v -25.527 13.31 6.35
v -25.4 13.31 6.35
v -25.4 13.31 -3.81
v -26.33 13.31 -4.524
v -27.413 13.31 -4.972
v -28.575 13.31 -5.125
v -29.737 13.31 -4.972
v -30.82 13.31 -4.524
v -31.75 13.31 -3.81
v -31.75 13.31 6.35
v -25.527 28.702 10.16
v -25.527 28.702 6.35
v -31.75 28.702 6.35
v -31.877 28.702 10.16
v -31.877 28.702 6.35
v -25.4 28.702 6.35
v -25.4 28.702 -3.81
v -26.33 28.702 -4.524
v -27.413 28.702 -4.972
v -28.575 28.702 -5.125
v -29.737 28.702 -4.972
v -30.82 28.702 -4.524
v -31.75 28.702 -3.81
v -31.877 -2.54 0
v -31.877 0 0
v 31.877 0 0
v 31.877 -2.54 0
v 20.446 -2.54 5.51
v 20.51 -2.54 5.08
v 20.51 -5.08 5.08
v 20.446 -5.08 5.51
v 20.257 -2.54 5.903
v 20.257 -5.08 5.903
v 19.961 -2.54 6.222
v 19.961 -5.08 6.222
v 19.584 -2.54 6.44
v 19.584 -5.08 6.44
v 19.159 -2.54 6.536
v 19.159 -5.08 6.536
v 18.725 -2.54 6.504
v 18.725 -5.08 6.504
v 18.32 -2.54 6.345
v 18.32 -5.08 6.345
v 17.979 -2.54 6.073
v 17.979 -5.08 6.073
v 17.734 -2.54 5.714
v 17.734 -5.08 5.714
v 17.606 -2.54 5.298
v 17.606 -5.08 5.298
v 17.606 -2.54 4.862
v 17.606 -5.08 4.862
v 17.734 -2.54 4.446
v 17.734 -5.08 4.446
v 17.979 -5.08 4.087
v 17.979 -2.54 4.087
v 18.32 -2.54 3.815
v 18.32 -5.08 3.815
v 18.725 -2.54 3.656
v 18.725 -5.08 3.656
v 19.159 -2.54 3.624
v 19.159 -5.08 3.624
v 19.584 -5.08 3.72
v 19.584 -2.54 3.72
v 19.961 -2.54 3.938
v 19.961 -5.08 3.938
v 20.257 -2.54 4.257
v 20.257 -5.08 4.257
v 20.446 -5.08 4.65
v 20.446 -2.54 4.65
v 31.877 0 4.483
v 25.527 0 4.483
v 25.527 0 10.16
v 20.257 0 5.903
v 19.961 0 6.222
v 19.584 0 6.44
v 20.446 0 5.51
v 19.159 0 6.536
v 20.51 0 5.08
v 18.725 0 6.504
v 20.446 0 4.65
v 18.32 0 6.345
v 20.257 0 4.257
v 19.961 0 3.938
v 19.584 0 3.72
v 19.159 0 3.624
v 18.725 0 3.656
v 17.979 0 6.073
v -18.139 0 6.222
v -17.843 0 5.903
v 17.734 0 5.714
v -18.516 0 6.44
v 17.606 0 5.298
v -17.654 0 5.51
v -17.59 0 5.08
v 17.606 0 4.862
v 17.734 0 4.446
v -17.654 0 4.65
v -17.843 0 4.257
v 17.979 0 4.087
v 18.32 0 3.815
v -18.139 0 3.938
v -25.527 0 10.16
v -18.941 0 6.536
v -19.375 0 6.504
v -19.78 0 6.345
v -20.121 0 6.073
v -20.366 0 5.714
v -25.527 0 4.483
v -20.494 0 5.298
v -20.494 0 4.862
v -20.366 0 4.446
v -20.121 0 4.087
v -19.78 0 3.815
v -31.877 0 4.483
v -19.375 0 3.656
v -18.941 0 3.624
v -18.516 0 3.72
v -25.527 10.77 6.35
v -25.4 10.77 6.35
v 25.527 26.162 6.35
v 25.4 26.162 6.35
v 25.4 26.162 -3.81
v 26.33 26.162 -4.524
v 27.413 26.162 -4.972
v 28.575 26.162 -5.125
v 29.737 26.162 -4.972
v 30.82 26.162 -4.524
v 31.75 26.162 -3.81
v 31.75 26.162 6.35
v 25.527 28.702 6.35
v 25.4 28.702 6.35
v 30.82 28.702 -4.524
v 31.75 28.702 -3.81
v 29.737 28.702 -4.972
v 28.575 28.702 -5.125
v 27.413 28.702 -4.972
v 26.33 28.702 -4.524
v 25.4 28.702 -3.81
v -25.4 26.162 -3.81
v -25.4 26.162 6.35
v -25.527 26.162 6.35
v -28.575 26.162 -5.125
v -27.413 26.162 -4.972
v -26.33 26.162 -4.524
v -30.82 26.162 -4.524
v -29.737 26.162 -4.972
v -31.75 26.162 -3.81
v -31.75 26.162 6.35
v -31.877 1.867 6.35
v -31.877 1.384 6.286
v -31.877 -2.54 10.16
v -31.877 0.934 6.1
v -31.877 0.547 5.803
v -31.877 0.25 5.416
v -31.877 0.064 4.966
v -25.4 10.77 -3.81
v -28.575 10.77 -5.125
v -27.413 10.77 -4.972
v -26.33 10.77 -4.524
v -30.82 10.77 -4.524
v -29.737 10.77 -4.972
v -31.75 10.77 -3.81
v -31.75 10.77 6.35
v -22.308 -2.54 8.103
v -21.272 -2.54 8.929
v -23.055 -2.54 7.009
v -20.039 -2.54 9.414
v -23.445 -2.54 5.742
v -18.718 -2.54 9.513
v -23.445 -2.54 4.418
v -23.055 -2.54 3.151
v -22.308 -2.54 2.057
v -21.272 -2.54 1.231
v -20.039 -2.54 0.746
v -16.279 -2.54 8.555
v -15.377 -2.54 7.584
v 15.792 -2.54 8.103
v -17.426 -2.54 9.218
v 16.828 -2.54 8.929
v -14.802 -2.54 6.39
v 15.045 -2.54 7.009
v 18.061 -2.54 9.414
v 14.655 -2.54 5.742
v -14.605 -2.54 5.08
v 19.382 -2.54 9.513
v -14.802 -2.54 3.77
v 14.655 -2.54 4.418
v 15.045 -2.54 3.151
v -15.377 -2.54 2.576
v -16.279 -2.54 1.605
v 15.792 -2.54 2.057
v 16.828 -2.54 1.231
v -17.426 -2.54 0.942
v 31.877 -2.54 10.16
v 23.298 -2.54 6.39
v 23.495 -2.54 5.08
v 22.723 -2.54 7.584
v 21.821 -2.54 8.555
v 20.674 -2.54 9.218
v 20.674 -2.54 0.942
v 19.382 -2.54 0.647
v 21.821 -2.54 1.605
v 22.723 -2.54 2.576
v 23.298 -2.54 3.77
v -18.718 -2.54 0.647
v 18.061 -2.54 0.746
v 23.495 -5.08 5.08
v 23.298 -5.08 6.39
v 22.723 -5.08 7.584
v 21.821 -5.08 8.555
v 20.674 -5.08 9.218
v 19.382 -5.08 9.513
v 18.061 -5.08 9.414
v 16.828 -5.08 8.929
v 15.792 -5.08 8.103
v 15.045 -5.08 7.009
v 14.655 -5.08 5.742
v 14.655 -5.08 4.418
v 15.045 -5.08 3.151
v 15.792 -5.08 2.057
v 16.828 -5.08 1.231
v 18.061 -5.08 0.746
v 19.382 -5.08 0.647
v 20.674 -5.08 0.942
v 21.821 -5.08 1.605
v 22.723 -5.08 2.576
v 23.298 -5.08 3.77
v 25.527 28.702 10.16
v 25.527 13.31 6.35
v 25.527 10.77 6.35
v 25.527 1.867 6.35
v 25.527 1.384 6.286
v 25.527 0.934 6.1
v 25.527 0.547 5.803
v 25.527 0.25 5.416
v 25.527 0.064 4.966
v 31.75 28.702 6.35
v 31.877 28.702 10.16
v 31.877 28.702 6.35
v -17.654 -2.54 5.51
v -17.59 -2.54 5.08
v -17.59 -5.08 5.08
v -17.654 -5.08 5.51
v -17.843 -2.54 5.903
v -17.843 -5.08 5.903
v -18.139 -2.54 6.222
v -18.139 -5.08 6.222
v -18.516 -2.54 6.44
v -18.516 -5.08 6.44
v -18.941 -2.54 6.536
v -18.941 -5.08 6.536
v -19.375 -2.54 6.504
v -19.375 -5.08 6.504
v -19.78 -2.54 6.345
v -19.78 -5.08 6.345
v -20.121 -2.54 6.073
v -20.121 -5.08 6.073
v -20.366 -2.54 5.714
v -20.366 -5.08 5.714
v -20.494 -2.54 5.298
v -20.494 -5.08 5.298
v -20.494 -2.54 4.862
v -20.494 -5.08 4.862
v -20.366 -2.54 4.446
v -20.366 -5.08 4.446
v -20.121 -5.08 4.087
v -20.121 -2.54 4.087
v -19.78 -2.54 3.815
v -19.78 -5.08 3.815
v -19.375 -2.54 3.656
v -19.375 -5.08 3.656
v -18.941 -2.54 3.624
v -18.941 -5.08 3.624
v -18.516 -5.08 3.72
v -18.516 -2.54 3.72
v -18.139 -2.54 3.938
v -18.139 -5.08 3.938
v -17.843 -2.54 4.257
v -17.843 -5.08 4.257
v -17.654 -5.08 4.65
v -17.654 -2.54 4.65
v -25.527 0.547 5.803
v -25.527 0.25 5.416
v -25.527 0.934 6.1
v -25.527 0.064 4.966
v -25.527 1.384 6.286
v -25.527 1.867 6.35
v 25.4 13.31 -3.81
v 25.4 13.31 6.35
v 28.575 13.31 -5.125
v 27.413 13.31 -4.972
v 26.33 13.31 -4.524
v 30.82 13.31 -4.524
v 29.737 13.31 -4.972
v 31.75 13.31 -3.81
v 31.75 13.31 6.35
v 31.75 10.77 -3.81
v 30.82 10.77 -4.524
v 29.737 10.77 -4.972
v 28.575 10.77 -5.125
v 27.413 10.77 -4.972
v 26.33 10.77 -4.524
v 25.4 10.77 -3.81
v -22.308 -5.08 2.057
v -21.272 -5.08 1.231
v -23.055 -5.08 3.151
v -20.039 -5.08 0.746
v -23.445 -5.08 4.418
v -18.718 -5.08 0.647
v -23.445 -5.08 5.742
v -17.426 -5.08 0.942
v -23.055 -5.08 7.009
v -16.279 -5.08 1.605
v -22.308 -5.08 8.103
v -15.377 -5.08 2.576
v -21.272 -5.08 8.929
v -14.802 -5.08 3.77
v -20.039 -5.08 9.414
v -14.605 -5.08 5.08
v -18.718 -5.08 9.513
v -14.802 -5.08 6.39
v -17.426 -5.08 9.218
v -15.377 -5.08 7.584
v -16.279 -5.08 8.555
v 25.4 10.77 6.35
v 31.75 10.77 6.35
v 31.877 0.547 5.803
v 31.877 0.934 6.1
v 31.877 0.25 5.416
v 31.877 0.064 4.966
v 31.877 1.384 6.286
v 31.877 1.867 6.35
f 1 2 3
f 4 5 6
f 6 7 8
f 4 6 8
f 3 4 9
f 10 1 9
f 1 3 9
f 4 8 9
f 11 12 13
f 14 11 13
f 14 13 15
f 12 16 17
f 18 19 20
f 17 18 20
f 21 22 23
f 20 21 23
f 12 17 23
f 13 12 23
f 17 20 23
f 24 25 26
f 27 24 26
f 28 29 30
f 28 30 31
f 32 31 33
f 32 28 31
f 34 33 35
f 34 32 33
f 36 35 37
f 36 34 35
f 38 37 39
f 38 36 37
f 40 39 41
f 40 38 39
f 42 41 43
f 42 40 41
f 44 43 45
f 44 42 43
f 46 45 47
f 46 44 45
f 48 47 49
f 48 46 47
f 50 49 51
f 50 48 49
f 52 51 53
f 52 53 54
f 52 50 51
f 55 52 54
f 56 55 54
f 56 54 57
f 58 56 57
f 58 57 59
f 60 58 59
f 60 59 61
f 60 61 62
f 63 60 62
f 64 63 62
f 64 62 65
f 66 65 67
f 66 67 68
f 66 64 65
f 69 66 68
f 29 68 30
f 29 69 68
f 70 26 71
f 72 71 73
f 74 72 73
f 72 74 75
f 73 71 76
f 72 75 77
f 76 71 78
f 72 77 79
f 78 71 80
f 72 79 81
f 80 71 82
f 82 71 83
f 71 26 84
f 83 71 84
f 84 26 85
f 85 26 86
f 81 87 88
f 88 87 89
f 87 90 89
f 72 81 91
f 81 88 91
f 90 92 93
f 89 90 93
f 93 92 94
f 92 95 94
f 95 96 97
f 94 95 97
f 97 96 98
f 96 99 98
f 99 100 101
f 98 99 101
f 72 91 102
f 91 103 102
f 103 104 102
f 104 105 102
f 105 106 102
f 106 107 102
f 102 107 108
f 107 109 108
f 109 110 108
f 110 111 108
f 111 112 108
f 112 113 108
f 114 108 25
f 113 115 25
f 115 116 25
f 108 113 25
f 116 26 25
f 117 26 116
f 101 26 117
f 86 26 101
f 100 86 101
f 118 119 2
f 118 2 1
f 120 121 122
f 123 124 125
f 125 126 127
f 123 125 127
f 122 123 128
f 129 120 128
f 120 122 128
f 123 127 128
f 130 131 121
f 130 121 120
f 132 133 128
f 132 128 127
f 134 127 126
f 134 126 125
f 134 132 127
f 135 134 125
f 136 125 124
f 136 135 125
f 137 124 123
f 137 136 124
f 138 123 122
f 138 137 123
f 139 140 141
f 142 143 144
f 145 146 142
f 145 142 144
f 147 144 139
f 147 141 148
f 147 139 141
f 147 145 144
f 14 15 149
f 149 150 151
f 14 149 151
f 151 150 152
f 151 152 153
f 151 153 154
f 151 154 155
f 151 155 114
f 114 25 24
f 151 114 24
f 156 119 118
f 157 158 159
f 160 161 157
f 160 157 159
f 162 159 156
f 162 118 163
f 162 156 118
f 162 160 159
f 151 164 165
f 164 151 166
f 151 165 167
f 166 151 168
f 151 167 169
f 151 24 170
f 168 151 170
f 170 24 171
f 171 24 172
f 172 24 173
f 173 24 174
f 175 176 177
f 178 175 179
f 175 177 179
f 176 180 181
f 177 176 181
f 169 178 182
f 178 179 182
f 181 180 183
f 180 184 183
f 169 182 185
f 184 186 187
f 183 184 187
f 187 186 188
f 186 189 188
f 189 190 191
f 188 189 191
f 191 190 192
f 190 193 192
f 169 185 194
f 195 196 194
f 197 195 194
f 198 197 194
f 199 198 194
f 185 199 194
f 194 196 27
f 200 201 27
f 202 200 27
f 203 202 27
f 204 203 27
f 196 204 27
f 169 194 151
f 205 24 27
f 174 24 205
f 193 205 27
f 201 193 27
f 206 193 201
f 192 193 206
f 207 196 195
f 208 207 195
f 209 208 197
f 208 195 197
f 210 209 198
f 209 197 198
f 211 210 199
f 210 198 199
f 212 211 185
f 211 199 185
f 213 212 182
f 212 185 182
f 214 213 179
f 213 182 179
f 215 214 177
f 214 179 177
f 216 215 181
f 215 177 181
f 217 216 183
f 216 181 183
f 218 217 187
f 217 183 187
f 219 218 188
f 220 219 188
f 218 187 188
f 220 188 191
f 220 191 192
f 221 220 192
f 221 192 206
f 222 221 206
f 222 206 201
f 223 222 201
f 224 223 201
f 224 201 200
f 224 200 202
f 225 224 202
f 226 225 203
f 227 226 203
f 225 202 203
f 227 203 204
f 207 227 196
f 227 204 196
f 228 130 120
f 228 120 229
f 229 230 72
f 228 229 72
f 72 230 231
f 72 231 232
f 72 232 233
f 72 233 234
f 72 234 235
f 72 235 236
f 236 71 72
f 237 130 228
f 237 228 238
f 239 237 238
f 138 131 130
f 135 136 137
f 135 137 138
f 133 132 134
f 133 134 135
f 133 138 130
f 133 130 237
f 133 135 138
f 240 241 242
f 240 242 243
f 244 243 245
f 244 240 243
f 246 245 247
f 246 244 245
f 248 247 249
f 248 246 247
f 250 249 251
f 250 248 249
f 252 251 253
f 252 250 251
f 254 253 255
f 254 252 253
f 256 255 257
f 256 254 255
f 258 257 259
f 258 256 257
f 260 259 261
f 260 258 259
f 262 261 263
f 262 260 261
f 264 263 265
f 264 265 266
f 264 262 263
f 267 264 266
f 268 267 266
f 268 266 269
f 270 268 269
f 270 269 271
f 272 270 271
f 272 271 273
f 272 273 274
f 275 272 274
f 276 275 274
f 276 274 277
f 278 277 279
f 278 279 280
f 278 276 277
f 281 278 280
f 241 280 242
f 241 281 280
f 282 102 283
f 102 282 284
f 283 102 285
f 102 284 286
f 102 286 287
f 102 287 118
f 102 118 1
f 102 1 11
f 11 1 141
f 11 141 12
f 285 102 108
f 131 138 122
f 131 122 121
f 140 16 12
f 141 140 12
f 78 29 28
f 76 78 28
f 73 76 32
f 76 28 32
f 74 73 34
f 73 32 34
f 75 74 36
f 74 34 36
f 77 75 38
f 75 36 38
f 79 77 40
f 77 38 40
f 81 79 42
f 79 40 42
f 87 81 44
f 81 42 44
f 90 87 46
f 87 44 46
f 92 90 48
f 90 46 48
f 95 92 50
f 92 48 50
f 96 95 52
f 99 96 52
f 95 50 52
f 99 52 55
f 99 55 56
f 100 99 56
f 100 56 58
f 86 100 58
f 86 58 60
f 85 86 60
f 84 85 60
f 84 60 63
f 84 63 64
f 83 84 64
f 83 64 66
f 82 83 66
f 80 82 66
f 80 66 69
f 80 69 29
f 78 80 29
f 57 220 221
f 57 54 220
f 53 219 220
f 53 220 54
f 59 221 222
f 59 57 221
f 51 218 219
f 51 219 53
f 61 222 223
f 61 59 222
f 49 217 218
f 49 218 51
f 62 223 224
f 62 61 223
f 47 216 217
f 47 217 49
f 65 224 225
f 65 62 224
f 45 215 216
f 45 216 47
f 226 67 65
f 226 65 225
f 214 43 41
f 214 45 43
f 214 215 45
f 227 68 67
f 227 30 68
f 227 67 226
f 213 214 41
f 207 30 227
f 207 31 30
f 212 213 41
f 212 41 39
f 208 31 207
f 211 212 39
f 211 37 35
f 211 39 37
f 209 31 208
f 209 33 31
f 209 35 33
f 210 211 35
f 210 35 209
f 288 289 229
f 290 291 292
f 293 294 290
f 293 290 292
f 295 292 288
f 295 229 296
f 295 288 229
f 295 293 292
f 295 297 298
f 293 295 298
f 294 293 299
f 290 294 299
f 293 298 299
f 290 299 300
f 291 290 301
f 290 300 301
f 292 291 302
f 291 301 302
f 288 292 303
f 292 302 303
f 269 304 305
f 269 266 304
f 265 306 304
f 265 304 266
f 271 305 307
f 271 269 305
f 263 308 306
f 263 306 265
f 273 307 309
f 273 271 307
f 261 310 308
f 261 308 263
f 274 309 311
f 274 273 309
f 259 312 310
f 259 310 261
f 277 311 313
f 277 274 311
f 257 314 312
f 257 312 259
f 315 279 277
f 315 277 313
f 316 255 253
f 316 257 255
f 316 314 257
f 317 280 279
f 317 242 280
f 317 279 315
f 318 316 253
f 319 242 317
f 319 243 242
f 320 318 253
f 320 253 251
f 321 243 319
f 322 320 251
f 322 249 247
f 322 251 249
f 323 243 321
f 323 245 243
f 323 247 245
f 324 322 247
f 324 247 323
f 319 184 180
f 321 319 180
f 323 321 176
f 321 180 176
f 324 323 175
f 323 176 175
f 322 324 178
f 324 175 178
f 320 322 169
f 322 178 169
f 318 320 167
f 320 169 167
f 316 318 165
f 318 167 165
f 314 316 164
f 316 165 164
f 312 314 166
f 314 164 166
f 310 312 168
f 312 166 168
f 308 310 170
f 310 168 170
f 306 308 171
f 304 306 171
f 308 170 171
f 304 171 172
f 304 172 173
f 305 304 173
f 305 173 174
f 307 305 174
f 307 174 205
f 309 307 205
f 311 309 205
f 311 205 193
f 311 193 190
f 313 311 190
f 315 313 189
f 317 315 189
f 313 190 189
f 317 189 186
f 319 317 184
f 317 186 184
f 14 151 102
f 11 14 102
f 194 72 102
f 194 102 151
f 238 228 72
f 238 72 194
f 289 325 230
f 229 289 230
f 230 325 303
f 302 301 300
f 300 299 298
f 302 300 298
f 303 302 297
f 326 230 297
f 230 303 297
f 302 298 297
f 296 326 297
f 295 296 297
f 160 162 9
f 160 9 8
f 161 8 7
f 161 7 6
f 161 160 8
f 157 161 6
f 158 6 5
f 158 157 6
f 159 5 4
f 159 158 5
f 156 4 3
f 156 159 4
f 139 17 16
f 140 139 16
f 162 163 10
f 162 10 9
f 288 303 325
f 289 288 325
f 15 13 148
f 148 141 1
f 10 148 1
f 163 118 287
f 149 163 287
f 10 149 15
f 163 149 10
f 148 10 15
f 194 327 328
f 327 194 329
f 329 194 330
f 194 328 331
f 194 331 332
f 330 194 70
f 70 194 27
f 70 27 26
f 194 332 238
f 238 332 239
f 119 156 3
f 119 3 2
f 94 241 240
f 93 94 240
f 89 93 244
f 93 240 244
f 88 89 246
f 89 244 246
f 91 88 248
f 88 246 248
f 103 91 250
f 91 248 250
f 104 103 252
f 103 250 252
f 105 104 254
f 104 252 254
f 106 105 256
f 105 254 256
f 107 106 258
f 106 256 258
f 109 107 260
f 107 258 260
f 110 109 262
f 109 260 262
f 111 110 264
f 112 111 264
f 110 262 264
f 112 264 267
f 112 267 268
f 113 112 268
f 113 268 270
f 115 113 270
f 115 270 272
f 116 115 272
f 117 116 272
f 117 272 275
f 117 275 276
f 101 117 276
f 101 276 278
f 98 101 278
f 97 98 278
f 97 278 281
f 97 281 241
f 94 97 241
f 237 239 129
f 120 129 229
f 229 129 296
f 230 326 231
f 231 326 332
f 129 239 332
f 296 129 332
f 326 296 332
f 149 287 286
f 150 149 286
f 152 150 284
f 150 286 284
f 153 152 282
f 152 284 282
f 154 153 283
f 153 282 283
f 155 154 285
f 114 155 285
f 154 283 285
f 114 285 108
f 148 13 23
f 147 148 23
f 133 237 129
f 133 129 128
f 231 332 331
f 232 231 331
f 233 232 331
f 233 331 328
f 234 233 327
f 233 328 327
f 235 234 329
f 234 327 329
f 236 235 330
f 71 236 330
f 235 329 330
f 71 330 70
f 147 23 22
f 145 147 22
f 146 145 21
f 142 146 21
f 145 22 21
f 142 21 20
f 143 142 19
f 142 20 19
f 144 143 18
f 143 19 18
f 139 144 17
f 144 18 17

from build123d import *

# Parameters (mm, degrees)
BOSS_EXTRUDE1_DEPTH  = 10.16
CUT_EXTRUDE1_DEPTH   = 64.754
SKETCH3_R            = 1.4605
CUT_EXTRUDE2_DEPTH   = 6.35
BOSS_EXTRUDE2_DEPTH  = 2.54
MIRROR2_COPY_1_DEPTH = 2.54
SKETCH6_R            = 4.445
SKETCH6_R_2          = 1.4605
BOSS_EXTRUDE3_DEPTH  = 2.54


with BuildPart() as part:
    # Sketch1 → Boss-Extrude1 (new body)
    with BuildSketch(Plane.XY):
        Polygon((25.527, 0), (-25.527, 0), (-25.527, 28.702), (-31.877, 28.702), (-31.877, -2.54), (31.877, -2.54), (31.877, 28.702), (25.527, 28.702), align=None)
    extrude(amount=BOSS_EXTRUDE1_DEPTH)

    # Sketch2 → Cut-Extrude1 (cut, through all)
    with BuildSketch(Plane(origin=(31.877, 0, 0), x_dir=(0, 0, -1), z_dir=(1, 0, 0))):
        with BuildLine():
            Line((-6.35, 28.702), (-6.35, 1.867416652))
            ThreePointArc((-6.35, 1.867416652), (-5.803046326, 0.546953674), (-4.482583348, 0))
            Line((-4.482583348, 0), (0, 0))
            Line((0, 0), (0, 28.702))
            Line((0, 28.702), (-6.35, 28.702))
        make_face()
    extrude(amount=-CUT_EXTRUDE1_DEPTH, mode=Mode.SUBTRACT)

    # Sketch3 → Cut-Extrude2 (cut)
    with BuildSketch(Plane.XZ.offset(2.54)):
        with Locations((-19.05, 5.08)):
            Circle(SKETCH3_R)
        with Locations((19.05, 5.08)):
            Circle(SKETCH3_R)
    extrude(amount=-CUT_EXTRUDE2_DEPTH, mode=Mode.SUBTRACT)

    # Sketch5 → Boss-Extrude2 (add)
    with BuildSketch(Plane(origin=(0, 28.702, 0), x_dir=(1, 0, 0), z_dir=(0, 1, 0))):
        with BuildLine():
            Line((-31.75, -6.35), (-31.75, 3.81))
            ThreePointArc((-31.75, 3.81), (-28.575, 5.125128061), (-25.4, 3.81))
            Line((-25.4, 3.81), (-25.4, -6.35))
            Line((-25.4, -6.35), (-31.75, -6.35))
        make_face()
    boss_extrude2 = extrude(amount=-BOSS_EXTRUDE2_DEPTH)

    # Mirror1: Boss-Extrude2 across plane
    add(boss_extrude2.mirror(Plane(origin=(0, 19.7358, 0), x_dir=(0, 0, 1), z_dir=(0, -1, 0))))

    # Mirror2: Boss-Extrude2 across plane
    add(boss_extrude2.mirror(Plane(origin=(0, 0, 0), x_dir=(0, 0, 1), z_dir=(1, 0, 0))))

    # Mirror2 copy 1 sketch → Mirror2 copy 1 (add)
    with BuildSketch(Plane(origin=(0, 10.7696, 0), x_dir=(-1, 0, 0), z_dir=(0, -1, 0))):
        with BuildLine():
            Line((-31.75, -6.35), (-31.75, 3.81))
            ThreePointArc((-31.75, 3.81), (-28.575, 5.125128061), (-25.4, 3.81))
            Line((-25.4, 3.81), (-25.4, -6.35))
            Line((-25.4, -6.35), (-31.75, -6.35))
        make_face()
    extrude(amount=-MIRROR2_COPY_1_DEPTH)

    # Sketch6 → Boss-Extrude3 (add)
    with BuildSketch(Plane.XZ.offset(2.54)):
        with Locations((-19.05, 5.08)):
            Circle(SKETCH6_R)
        with Locations((-19.05, 5.08)):
            Circle(SKETCH6_R_2, mode=Mode.SUBTRACT)
        with Locations((19.05, 5.08)):
            Circle(SKETCH6_R)
        with Locations((19.05, 5.08)):
            Circle(SKETCH6_R_2, mode=Mode.SUBTRACT)
    extrude(amount=BOSS_EXTRUDE3_DEPTH)


solid = part.part
